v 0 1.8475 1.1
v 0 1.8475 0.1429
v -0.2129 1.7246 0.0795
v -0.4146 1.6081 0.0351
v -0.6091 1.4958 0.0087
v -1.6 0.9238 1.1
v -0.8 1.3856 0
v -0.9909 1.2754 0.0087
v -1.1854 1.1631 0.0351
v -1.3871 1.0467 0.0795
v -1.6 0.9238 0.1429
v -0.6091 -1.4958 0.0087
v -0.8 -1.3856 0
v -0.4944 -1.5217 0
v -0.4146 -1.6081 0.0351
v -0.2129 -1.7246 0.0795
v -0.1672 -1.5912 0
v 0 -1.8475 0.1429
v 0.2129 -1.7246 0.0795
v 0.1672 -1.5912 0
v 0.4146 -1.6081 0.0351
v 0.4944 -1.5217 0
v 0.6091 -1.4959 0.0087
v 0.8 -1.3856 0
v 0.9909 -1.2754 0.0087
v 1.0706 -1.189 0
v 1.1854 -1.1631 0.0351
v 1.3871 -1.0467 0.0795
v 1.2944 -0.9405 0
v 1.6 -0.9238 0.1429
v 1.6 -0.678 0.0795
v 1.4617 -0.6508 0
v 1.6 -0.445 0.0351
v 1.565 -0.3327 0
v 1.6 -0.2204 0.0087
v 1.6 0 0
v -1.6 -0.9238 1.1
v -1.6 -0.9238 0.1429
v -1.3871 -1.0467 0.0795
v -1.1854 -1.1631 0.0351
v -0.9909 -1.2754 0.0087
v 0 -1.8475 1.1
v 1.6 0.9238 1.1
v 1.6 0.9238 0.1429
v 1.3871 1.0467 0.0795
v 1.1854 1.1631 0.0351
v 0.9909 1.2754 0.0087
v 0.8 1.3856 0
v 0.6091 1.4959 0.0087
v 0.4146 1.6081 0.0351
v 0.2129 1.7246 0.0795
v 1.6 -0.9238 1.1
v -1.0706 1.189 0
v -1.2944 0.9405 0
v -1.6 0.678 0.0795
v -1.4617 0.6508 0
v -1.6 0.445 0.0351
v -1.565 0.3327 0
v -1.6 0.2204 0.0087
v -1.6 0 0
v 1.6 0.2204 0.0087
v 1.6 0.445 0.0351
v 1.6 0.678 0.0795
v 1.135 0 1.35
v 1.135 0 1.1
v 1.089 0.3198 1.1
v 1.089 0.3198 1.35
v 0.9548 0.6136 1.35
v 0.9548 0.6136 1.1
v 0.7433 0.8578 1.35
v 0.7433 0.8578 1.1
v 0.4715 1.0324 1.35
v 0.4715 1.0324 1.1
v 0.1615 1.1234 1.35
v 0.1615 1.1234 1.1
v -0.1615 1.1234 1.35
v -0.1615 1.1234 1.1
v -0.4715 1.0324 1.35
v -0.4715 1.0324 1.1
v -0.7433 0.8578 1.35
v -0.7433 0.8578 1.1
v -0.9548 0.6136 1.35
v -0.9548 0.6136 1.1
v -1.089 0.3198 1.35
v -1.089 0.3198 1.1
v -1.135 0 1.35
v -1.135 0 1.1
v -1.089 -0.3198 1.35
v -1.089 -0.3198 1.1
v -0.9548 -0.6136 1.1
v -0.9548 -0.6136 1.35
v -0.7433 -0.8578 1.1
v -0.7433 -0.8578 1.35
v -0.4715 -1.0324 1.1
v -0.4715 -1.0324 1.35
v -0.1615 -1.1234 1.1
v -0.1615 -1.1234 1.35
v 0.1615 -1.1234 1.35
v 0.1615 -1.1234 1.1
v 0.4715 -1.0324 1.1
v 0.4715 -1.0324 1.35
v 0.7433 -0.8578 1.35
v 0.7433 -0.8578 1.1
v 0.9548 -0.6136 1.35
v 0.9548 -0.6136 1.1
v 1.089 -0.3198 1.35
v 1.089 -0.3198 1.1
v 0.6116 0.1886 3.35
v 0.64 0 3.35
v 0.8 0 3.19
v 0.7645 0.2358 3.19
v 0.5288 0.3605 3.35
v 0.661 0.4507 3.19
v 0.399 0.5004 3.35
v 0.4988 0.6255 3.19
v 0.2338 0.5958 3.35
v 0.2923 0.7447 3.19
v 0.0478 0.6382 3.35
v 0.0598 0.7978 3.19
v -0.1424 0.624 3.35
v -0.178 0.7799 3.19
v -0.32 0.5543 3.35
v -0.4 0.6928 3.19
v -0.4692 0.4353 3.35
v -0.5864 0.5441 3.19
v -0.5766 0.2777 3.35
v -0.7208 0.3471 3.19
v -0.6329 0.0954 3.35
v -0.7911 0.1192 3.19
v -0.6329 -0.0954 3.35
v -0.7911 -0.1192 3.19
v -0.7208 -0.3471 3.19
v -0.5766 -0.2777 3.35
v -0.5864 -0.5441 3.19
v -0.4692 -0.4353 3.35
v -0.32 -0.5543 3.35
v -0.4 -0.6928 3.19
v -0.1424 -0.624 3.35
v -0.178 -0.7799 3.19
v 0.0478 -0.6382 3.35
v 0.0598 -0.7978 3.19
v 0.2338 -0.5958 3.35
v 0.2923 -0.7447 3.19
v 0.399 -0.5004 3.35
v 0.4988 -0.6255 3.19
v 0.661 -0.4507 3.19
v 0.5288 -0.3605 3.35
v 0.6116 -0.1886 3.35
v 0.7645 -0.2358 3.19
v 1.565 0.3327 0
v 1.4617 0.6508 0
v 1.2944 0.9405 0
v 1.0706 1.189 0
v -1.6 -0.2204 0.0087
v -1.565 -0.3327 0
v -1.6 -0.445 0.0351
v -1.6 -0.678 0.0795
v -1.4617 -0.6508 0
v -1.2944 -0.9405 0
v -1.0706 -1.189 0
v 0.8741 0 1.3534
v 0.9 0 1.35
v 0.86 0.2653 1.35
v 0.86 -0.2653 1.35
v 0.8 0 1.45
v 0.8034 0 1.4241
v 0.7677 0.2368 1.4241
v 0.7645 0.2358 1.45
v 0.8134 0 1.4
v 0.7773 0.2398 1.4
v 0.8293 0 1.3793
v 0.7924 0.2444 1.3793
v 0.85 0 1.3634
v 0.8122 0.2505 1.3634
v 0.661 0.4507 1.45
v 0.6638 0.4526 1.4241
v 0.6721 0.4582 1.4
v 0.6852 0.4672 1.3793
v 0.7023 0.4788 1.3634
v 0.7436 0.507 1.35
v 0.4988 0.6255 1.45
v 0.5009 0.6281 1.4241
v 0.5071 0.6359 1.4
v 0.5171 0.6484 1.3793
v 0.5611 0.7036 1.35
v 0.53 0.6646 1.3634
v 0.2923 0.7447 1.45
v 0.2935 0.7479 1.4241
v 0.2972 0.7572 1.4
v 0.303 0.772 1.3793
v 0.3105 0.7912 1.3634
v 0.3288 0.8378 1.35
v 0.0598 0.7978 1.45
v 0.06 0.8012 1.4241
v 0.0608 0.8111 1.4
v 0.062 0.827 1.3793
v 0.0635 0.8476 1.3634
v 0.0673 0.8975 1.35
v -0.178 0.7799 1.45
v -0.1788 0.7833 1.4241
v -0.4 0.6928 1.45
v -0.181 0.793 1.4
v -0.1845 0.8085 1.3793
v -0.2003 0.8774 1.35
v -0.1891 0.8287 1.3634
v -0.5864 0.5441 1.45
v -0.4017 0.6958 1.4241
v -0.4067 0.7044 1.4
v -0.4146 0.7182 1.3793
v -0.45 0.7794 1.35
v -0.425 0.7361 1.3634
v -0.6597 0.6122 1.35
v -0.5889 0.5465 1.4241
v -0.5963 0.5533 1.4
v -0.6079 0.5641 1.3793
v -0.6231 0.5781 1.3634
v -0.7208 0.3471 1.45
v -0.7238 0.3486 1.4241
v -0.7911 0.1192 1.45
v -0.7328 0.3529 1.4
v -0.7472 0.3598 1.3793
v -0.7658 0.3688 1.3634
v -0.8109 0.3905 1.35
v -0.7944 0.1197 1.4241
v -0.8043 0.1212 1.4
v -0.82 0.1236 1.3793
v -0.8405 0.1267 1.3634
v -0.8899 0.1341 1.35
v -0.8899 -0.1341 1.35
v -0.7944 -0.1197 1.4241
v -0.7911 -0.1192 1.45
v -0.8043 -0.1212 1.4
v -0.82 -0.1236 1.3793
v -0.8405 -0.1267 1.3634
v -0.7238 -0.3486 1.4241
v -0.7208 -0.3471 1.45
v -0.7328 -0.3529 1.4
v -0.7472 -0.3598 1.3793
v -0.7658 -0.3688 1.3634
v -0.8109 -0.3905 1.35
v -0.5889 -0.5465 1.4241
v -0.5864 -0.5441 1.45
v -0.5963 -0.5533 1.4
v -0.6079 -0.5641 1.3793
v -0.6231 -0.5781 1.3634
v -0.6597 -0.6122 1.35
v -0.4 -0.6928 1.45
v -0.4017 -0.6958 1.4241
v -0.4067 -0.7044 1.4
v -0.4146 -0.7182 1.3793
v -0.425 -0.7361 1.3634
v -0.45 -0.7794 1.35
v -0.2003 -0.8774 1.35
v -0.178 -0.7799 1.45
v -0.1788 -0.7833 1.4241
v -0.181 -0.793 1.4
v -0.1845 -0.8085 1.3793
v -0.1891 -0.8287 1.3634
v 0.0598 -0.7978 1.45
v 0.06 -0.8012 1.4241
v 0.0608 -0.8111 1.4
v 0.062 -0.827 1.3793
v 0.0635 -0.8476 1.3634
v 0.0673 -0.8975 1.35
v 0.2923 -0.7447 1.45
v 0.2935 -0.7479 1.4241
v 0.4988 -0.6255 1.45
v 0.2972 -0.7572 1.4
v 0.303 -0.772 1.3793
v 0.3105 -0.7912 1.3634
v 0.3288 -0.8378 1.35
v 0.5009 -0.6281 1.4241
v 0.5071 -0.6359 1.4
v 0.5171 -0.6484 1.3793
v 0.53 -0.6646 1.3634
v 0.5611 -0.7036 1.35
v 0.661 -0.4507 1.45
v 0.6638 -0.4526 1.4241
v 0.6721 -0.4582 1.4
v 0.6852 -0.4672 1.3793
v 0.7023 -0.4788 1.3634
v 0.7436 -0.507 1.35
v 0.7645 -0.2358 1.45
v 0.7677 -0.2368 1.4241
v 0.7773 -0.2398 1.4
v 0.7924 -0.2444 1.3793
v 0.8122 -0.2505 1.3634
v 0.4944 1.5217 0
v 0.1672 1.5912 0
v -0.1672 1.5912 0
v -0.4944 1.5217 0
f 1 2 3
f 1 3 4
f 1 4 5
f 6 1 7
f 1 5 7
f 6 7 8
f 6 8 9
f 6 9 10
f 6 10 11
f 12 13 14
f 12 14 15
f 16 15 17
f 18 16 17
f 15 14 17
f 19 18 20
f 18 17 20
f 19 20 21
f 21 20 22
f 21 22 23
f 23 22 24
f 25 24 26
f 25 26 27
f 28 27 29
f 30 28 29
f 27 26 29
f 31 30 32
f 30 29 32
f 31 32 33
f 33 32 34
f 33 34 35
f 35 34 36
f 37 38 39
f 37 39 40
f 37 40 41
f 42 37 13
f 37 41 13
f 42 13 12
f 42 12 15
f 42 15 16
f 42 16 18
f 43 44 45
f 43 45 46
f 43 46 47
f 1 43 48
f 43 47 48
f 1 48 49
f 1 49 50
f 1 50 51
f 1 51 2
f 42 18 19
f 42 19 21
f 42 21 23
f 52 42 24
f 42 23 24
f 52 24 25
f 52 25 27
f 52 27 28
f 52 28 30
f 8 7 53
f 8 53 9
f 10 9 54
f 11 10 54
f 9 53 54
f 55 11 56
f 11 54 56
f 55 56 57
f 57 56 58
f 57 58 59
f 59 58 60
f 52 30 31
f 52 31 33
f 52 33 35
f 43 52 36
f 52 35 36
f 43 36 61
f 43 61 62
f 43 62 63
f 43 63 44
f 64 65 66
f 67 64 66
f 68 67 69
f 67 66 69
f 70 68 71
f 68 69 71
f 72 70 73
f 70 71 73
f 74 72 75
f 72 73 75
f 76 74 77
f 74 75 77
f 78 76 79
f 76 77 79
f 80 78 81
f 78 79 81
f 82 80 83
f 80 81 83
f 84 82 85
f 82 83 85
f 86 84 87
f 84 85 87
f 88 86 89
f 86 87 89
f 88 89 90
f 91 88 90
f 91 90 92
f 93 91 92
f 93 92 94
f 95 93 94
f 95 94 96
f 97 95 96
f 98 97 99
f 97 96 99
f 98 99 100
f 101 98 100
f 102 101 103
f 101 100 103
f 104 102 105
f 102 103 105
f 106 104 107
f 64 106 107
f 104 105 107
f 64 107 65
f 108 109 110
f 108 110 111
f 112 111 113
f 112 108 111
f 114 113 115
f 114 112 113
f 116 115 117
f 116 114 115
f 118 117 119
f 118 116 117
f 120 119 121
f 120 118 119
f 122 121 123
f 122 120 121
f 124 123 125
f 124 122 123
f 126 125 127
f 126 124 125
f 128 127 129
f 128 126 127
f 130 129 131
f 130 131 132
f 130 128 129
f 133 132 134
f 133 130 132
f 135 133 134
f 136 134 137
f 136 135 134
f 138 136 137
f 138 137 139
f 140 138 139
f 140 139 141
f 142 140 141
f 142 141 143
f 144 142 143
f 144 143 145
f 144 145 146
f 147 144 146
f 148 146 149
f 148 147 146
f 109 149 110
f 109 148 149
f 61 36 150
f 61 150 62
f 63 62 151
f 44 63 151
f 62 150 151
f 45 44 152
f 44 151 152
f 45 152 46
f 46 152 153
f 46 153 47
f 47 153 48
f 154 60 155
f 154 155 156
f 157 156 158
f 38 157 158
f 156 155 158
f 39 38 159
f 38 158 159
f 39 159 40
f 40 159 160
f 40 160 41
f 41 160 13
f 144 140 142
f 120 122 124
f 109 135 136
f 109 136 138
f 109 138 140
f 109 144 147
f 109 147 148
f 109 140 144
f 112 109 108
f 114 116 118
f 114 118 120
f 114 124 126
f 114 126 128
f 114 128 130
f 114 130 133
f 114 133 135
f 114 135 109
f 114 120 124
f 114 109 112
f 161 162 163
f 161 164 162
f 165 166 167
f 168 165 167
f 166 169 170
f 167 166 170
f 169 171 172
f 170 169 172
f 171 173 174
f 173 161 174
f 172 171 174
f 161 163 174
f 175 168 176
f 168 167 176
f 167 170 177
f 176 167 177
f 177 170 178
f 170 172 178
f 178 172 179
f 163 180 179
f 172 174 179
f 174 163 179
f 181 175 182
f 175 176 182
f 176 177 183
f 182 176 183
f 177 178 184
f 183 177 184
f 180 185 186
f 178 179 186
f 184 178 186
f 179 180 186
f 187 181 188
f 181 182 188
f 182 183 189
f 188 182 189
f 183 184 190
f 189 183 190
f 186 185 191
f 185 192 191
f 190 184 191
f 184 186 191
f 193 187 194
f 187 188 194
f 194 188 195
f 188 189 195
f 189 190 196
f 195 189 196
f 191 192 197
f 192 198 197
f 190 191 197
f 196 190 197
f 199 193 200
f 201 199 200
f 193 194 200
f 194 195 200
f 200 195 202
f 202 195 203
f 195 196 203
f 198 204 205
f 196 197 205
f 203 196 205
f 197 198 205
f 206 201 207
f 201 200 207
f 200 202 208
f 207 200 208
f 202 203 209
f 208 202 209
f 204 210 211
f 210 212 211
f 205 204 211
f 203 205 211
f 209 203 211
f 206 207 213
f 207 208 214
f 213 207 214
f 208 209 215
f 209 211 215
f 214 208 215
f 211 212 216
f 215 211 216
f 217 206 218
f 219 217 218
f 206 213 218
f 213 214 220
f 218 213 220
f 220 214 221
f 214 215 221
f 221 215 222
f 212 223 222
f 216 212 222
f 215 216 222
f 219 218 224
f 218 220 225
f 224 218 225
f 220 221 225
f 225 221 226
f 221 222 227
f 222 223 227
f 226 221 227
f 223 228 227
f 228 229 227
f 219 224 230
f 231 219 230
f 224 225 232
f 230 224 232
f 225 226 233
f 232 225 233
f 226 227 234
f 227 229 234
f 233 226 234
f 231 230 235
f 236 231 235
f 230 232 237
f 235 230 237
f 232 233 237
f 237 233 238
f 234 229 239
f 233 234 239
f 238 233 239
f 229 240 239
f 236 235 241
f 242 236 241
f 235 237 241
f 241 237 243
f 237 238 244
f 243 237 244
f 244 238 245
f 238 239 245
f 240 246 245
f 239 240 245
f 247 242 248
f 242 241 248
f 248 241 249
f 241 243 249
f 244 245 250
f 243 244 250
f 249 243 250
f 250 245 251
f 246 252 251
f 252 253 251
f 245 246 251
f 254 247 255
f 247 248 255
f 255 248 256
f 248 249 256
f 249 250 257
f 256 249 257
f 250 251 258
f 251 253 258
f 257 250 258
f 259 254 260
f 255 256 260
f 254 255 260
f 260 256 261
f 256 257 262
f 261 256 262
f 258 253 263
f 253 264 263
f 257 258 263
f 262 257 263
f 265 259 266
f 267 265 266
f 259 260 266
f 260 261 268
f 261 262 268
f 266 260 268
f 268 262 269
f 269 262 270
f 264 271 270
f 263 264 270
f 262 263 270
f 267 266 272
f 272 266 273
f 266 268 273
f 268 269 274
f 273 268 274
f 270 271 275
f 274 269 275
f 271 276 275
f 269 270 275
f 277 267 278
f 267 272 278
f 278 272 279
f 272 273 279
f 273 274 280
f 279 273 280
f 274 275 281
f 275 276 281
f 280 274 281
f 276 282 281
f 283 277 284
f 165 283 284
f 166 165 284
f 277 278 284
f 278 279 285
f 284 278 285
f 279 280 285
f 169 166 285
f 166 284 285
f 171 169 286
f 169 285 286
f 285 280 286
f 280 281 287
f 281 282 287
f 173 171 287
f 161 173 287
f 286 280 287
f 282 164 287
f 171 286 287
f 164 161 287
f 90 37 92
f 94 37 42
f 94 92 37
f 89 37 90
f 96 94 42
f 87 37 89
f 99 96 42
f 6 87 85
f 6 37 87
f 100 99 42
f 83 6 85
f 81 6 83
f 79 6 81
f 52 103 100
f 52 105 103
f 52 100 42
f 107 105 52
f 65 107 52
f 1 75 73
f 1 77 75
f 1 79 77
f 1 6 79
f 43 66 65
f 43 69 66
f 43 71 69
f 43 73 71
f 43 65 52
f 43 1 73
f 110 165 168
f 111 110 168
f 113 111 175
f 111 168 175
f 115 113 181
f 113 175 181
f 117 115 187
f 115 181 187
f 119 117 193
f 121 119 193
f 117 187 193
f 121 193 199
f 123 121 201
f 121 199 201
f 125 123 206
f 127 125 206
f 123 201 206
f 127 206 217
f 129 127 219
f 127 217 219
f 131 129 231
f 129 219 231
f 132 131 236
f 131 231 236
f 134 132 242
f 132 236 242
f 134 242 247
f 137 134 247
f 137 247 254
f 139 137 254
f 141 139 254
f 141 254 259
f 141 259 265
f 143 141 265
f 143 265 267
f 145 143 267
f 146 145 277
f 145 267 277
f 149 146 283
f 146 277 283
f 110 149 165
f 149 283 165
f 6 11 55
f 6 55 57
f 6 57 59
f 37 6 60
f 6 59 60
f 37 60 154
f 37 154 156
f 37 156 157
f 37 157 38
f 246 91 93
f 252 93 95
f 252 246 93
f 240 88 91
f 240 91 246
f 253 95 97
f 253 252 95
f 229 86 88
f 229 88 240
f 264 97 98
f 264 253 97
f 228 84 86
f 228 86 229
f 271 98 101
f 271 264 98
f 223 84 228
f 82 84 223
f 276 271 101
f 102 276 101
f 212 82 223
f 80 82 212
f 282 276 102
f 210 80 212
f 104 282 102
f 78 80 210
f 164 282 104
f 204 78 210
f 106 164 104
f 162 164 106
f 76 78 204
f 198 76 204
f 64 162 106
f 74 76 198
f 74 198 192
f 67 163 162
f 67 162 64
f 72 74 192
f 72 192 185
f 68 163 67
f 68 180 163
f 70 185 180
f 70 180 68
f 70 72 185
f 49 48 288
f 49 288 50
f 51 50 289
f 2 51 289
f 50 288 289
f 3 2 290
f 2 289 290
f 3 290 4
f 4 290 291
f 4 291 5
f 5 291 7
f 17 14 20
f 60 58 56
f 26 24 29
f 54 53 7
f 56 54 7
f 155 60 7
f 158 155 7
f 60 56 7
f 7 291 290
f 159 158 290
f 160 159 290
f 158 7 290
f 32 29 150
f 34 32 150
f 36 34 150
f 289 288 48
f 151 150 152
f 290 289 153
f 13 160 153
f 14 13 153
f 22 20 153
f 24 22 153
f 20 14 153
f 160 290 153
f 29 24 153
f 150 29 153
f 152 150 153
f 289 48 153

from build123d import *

# Parameters (mm, degrees)
VYSUNOUT1_DEPTH = 1.1
SKICA3_R        = 1.135
VYSUNOUT2_DEPTH = 0.25
SKICA4_R        = 0.8
VYSUNOUT3_DEPTH = 2
ZKOSIT1_SIZE    = 0.16
ZAOBLIT1_R      = 0.1


with BuildPart() as part:
    # Skica1 → Vysunout1 (new body)
    with BuildSketch(Plane.XY):
        Polygon((1.6, -0.923760431), (1.6, 0.923760431), (0, 1.847520861), (-1.6, 0.923760431), (-1.6, -0.923760431), (0, -1.847520861), align=None)
    extrude(amount=VYSUNOUT1_DEPTH)

    # Skica2 → Odebrat otočením1 (revolve, cut)
    with BuildSketch(Plane(origin=(0, 0, 0), x_dir=(1, 0, 0), z_dir=(0, 1, 0))):
        Polygon((1.6, 0), (3.505255888, 0), (3.505255888, -1.1), align=None)
    revolve(axis=Axis((0, 0, 0), (0, 0, 1)), mode=Mode.SUBTRACT)

    # Skica3 → Vysunout2 (add)
    with BuildSketch(Plane.XY.offset(1.1)):
        Circle(SKICA3_R)
    extrude(amount=VYSUNOUT2_DEPTH)

    # Skica4 → Vysunout3 (add)
    with BuildSketch(Plane.XY.offset(1.35)):
        Circle(SKICA4_R)
    extrude(amount=VYSUNOUT3_DEPTH)

    # Zkosit1
    zkosit1_edges = [part.edges().sort_by_distance(p)[0] for p in [
        (-0.8, 0, 3.35),
    ]]
    chamfer(zkosit1_edges, length=ZKOSIT1_SIZE)

    # Zaoblit1
    zaoblit1_edges = [part.edges().sort_by_distance(p)[0] for p in [
        (-0.8, 0, 1.35),
    ]]
    fillet(zaoblit1_edges, radius=ZAOBLIT1_R)


solid = part.part
